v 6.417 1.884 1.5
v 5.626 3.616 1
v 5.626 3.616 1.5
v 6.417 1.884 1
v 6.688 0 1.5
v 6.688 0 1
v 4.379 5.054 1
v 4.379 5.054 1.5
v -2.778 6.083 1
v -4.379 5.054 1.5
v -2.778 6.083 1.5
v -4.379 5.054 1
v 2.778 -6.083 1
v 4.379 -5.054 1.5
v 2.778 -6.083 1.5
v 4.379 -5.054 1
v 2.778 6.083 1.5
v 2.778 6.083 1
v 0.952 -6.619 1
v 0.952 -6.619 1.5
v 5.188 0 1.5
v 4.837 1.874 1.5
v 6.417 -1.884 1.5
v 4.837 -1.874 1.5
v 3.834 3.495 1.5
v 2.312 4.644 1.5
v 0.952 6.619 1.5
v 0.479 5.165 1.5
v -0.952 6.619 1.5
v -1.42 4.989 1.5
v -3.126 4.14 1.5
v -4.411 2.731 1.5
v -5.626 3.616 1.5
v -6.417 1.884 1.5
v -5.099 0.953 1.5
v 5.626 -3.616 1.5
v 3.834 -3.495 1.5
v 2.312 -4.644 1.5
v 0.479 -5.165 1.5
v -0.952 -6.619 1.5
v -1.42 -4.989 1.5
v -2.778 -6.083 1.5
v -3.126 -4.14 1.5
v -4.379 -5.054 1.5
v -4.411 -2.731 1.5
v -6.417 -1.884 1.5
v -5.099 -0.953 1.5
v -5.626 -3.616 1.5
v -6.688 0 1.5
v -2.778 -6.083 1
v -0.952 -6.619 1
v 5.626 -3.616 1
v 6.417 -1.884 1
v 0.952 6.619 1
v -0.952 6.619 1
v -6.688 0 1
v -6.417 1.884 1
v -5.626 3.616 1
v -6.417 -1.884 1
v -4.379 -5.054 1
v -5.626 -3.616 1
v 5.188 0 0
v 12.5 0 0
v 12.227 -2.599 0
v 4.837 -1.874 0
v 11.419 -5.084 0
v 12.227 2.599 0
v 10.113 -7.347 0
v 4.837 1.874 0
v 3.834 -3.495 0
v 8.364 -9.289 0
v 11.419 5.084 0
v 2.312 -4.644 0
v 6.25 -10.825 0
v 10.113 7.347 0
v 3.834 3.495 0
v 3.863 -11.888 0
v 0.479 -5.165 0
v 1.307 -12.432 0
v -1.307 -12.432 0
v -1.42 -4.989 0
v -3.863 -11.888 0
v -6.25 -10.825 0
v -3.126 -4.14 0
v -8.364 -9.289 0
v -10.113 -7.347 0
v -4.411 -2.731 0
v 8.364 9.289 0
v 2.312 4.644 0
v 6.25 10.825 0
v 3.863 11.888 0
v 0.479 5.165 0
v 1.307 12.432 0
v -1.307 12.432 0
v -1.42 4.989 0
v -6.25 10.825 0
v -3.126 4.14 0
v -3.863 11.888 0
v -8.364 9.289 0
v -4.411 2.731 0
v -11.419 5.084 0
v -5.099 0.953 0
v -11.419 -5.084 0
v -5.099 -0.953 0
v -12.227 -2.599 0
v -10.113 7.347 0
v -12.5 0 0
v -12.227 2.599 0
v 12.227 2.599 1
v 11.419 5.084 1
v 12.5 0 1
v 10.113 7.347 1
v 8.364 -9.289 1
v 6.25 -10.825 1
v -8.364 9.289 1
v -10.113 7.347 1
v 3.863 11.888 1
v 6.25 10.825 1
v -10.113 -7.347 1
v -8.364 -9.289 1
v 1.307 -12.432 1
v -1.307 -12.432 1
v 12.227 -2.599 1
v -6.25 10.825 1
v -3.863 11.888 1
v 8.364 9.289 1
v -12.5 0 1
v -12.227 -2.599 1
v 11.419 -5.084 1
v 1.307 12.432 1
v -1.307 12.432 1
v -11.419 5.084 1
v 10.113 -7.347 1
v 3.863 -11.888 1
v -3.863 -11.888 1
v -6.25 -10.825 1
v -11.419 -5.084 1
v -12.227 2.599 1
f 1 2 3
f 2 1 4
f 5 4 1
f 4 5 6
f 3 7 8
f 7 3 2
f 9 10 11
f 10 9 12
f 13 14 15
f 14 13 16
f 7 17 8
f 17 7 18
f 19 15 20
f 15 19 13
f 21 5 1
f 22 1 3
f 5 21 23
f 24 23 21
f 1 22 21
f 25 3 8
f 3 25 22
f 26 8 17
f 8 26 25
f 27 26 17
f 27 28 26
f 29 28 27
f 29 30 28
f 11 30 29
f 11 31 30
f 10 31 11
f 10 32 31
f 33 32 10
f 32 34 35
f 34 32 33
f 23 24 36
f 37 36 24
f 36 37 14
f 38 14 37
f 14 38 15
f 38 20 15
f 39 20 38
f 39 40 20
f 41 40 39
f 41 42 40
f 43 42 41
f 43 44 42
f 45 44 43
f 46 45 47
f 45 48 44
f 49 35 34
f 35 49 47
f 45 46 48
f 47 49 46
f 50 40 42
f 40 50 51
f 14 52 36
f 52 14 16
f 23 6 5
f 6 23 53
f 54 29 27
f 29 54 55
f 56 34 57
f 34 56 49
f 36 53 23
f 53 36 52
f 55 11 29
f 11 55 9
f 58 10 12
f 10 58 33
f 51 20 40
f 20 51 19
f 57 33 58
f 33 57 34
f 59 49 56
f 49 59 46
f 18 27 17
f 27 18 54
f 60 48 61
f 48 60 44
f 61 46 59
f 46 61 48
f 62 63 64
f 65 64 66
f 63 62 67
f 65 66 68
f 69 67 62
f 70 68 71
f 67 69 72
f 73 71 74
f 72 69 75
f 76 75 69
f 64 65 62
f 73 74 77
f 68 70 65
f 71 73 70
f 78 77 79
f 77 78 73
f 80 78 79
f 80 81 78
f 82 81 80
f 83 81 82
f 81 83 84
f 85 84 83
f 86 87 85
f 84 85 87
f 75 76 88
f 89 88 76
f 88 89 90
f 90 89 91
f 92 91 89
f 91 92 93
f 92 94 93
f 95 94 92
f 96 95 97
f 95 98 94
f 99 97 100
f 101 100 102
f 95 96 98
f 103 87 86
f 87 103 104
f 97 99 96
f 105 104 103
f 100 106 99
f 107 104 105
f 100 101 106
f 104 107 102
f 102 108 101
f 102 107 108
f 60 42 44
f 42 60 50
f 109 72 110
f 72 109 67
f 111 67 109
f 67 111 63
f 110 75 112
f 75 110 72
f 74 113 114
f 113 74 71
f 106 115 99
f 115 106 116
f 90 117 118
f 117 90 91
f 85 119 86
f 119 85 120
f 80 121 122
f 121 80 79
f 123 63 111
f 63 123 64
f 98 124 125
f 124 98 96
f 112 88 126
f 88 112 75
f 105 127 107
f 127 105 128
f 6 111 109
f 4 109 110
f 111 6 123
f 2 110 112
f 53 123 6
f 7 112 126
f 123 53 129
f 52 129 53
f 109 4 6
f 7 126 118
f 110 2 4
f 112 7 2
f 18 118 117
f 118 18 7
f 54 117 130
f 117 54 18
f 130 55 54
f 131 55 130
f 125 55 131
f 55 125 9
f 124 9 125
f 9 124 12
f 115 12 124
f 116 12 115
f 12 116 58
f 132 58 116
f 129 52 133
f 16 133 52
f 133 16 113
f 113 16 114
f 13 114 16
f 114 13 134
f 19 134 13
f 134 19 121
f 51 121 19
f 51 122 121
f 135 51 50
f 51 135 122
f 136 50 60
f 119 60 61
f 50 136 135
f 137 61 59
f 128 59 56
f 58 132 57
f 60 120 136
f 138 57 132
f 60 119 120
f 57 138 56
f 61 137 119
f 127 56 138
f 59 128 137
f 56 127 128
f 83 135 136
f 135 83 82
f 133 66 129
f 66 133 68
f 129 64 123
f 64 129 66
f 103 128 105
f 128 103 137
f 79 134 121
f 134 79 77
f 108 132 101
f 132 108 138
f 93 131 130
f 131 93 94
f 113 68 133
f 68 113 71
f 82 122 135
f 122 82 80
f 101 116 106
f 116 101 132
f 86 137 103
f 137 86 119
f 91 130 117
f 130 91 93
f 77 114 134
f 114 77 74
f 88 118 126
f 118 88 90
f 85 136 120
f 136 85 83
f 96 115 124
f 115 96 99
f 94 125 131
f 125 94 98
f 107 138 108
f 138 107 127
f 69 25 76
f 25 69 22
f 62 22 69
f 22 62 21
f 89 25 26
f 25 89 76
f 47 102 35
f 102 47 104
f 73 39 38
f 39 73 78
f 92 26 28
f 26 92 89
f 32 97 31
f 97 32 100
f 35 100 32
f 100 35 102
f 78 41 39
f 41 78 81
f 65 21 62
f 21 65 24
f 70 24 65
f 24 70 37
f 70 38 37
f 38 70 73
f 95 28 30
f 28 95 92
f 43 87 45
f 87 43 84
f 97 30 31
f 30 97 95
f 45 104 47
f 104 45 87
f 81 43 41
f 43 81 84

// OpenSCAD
// Bearing guard printer

// Radius of inside of bearing
ir=4.6875;
// Race depth
race=2;
rr=ir+race;
// Guard radius (could be bearing size, or more if you like.
or=12.5;
// Thickness of guard
h=1;
// Thickness of race
raceH = 0.5;
h2=h+raceH;

difference() {
	union() {
		cylinder(r=rr, h=h2);
		cylinder(r=or, h=h);
		}
	cylinder(r=ir+.5, h=h2);
	}
